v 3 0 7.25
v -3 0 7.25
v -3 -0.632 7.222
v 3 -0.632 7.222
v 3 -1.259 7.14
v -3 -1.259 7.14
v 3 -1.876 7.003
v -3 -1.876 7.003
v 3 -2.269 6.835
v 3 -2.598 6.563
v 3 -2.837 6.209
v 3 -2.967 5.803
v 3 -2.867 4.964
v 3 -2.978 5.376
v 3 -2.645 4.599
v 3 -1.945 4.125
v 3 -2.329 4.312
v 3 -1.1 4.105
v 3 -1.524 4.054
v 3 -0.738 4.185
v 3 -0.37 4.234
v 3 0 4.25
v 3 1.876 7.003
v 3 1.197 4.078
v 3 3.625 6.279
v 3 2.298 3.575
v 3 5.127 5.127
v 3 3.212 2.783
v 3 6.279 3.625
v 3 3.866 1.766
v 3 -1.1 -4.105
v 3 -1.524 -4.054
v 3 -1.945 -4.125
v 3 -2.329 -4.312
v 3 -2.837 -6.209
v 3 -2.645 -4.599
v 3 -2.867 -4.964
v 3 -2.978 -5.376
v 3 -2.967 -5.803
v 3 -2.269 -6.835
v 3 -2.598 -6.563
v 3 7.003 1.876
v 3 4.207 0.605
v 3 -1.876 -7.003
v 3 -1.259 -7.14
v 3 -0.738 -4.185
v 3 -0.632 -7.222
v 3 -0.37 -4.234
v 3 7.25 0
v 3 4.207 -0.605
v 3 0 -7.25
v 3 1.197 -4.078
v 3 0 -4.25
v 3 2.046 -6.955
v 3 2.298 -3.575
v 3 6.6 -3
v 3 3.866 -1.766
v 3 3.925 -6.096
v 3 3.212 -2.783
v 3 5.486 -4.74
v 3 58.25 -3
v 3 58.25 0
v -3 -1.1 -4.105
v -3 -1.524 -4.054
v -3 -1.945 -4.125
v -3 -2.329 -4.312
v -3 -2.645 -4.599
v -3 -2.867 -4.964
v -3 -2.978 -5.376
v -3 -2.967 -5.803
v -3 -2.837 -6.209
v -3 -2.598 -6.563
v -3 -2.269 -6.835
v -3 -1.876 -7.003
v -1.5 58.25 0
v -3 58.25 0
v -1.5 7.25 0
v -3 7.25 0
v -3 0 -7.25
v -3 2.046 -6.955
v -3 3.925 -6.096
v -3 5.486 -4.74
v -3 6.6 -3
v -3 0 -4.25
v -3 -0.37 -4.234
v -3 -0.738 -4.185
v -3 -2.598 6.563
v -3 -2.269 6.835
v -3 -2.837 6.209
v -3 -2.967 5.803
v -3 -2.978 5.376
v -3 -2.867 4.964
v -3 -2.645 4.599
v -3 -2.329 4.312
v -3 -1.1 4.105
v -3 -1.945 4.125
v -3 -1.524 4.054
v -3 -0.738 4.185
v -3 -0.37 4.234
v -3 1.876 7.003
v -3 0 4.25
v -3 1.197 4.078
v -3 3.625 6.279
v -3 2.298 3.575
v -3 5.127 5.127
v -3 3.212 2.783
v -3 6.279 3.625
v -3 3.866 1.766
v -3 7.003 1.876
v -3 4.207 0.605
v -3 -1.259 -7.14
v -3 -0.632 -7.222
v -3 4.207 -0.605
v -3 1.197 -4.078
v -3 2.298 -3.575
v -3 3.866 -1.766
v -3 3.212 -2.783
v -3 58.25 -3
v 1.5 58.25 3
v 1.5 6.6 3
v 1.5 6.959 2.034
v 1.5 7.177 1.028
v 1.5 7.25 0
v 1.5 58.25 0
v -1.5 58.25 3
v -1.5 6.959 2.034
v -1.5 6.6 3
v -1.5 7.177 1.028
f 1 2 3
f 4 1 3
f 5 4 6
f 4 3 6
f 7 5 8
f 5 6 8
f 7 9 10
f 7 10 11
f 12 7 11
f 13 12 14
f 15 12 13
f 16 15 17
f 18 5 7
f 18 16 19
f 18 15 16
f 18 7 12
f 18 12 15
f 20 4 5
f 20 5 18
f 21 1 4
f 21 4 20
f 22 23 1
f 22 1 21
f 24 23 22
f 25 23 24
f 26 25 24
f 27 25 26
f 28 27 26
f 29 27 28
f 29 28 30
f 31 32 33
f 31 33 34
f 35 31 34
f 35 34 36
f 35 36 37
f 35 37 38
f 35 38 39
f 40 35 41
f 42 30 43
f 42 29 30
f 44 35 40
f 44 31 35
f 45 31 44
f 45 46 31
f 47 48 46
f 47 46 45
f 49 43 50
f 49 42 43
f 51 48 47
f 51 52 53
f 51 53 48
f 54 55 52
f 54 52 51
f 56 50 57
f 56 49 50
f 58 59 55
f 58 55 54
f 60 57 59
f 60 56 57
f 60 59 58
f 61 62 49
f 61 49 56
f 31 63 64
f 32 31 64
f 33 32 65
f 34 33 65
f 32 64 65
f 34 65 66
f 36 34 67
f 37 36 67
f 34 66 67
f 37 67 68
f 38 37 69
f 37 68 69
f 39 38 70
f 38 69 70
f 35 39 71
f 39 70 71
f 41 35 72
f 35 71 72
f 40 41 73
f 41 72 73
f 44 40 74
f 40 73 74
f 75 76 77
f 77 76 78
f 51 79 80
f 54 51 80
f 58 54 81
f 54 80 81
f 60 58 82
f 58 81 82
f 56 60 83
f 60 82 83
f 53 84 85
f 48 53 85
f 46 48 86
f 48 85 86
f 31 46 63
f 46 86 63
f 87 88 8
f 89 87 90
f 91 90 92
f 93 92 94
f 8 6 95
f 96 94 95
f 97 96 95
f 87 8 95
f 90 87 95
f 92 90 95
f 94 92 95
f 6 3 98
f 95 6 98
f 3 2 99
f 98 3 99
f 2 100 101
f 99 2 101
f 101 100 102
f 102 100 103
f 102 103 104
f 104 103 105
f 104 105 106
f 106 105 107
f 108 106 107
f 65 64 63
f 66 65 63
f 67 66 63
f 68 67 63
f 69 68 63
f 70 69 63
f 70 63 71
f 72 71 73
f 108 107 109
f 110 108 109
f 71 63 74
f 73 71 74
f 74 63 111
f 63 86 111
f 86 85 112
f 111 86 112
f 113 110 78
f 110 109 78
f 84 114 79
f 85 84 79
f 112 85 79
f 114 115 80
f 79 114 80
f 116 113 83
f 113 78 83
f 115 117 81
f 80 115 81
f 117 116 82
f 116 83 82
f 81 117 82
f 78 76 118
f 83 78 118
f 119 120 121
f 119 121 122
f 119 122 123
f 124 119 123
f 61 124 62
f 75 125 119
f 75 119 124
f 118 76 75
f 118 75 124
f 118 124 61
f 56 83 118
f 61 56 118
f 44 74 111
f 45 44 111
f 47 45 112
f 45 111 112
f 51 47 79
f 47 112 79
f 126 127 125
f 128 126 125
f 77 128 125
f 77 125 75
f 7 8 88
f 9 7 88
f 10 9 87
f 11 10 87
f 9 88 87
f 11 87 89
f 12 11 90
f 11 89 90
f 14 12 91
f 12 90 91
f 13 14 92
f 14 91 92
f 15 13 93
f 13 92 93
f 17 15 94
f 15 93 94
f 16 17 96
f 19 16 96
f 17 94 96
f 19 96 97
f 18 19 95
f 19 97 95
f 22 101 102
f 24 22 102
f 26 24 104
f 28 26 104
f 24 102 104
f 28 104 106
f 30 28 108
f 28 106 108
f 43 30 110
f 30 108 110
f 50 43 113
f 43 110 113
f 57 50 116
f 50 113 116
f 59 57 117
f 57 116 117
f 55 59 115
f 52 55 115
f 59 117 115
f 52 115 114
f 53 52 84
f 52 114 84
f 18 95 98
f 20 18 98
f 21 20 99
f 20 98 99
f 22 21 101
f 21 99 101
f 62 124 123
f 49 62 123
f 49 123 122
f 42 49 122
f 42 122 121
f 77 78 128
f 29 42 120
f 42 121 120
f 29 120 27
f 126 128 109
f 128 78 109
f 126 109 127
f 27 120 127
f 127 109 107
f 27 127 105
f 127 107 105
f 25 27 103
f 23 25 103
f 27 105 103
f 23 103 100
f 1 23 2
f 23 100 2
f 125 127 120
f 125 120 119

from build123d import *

# Parameters (mm, degrees)
BOSS_EXTRUDE1_DEPTH      = 3
BOSS_EXTRUDE1_DEPTH_BACK = 3
BOSS_EXTRUDE2_DEPTH      = 3
BOSS_EXTRUDE2_DEPTH_BACK = 3
BOSS_EXTRUDE3_DEPTH      = 1.5
BOSS_EXTRUDE3_DEPTH_BACK = 1.5
SKETCH3_W                = 3
SKETCH3_H                = 52


with BuildPart() as part:
    # Sketch1 → Boss-Extrude1 (new, two sides: drawn at the far end of the back side and taken through both)
    with BuildSketch(Plane(origin=(0, 0, 0), x_dir=(0, 0, -1), z_dir=(1, 0, 0)).offset(-BOSS_EXTRUDE1_DEPTH_BACK)):
        with BuildLine():
            ThreePointArc((-4.105184762, -1.099980942), (0, 4.25), (4.105184762, -1.099980942))
            ThreePointArc((4.105184762, -1.099980942), (5.165844934, -2.937098249), (7.002962241, -1.876438077))
            ThreePointArc((7.002962241, -1.876438077), (0, 7.25), (-7.002962241, -1.876438077))
            ThreePointArc((-7.002962241, -1.876438077), (-5.165844934, -2.937098249), (-4.105184762, -1.099980942))
        make_face()
    extrude(amount=BOSS_EXTRUDE1_DEPTH + BOSS_EXTRUDE1_DEPTH_BACK)

    # Sketch2 → Boss-Extrude2 (add, two sides: drawn at the far end of the back side and taken through both)
    with BuildSketch(Plane(origin=(0, 0, 0), x_dir=(0, 0, -1), z_dir=(1, 0, 0)).offset(-BOSS_EXTRUDE2_DEPTH_BACK)):
        Polygon((0, 7.25), (0, 5.25), (3, 5.25), (3, 58.25), (0, 58.25), align=None)
    extrude(amount=BOSS_EXTRUDE2_DEPTH + BOSS_EXTRUDE2_DEPTH_BACK)

    # Sketch3 → Boss-Extrude3 (add, two sides: drawn at the far end of the back side and taken through both)
    with BuildSketch(Plane(origin=(0, 0, 0), x_dir=(0, 0, -1), z_dir=(1, 0, 0)).offset(-BOSS_EXTRUDE3_DEPTH_BACK)):
        with Locations((-1.5, 32.25)):
            Rectangle(SKETCH3_W, SKETCH3_H)
    extrude(amount=BOSS_EXTRUDE3_DEPTH + BOSS_EXTRUDE3_DEPTH_BACK)


solid = part.part
